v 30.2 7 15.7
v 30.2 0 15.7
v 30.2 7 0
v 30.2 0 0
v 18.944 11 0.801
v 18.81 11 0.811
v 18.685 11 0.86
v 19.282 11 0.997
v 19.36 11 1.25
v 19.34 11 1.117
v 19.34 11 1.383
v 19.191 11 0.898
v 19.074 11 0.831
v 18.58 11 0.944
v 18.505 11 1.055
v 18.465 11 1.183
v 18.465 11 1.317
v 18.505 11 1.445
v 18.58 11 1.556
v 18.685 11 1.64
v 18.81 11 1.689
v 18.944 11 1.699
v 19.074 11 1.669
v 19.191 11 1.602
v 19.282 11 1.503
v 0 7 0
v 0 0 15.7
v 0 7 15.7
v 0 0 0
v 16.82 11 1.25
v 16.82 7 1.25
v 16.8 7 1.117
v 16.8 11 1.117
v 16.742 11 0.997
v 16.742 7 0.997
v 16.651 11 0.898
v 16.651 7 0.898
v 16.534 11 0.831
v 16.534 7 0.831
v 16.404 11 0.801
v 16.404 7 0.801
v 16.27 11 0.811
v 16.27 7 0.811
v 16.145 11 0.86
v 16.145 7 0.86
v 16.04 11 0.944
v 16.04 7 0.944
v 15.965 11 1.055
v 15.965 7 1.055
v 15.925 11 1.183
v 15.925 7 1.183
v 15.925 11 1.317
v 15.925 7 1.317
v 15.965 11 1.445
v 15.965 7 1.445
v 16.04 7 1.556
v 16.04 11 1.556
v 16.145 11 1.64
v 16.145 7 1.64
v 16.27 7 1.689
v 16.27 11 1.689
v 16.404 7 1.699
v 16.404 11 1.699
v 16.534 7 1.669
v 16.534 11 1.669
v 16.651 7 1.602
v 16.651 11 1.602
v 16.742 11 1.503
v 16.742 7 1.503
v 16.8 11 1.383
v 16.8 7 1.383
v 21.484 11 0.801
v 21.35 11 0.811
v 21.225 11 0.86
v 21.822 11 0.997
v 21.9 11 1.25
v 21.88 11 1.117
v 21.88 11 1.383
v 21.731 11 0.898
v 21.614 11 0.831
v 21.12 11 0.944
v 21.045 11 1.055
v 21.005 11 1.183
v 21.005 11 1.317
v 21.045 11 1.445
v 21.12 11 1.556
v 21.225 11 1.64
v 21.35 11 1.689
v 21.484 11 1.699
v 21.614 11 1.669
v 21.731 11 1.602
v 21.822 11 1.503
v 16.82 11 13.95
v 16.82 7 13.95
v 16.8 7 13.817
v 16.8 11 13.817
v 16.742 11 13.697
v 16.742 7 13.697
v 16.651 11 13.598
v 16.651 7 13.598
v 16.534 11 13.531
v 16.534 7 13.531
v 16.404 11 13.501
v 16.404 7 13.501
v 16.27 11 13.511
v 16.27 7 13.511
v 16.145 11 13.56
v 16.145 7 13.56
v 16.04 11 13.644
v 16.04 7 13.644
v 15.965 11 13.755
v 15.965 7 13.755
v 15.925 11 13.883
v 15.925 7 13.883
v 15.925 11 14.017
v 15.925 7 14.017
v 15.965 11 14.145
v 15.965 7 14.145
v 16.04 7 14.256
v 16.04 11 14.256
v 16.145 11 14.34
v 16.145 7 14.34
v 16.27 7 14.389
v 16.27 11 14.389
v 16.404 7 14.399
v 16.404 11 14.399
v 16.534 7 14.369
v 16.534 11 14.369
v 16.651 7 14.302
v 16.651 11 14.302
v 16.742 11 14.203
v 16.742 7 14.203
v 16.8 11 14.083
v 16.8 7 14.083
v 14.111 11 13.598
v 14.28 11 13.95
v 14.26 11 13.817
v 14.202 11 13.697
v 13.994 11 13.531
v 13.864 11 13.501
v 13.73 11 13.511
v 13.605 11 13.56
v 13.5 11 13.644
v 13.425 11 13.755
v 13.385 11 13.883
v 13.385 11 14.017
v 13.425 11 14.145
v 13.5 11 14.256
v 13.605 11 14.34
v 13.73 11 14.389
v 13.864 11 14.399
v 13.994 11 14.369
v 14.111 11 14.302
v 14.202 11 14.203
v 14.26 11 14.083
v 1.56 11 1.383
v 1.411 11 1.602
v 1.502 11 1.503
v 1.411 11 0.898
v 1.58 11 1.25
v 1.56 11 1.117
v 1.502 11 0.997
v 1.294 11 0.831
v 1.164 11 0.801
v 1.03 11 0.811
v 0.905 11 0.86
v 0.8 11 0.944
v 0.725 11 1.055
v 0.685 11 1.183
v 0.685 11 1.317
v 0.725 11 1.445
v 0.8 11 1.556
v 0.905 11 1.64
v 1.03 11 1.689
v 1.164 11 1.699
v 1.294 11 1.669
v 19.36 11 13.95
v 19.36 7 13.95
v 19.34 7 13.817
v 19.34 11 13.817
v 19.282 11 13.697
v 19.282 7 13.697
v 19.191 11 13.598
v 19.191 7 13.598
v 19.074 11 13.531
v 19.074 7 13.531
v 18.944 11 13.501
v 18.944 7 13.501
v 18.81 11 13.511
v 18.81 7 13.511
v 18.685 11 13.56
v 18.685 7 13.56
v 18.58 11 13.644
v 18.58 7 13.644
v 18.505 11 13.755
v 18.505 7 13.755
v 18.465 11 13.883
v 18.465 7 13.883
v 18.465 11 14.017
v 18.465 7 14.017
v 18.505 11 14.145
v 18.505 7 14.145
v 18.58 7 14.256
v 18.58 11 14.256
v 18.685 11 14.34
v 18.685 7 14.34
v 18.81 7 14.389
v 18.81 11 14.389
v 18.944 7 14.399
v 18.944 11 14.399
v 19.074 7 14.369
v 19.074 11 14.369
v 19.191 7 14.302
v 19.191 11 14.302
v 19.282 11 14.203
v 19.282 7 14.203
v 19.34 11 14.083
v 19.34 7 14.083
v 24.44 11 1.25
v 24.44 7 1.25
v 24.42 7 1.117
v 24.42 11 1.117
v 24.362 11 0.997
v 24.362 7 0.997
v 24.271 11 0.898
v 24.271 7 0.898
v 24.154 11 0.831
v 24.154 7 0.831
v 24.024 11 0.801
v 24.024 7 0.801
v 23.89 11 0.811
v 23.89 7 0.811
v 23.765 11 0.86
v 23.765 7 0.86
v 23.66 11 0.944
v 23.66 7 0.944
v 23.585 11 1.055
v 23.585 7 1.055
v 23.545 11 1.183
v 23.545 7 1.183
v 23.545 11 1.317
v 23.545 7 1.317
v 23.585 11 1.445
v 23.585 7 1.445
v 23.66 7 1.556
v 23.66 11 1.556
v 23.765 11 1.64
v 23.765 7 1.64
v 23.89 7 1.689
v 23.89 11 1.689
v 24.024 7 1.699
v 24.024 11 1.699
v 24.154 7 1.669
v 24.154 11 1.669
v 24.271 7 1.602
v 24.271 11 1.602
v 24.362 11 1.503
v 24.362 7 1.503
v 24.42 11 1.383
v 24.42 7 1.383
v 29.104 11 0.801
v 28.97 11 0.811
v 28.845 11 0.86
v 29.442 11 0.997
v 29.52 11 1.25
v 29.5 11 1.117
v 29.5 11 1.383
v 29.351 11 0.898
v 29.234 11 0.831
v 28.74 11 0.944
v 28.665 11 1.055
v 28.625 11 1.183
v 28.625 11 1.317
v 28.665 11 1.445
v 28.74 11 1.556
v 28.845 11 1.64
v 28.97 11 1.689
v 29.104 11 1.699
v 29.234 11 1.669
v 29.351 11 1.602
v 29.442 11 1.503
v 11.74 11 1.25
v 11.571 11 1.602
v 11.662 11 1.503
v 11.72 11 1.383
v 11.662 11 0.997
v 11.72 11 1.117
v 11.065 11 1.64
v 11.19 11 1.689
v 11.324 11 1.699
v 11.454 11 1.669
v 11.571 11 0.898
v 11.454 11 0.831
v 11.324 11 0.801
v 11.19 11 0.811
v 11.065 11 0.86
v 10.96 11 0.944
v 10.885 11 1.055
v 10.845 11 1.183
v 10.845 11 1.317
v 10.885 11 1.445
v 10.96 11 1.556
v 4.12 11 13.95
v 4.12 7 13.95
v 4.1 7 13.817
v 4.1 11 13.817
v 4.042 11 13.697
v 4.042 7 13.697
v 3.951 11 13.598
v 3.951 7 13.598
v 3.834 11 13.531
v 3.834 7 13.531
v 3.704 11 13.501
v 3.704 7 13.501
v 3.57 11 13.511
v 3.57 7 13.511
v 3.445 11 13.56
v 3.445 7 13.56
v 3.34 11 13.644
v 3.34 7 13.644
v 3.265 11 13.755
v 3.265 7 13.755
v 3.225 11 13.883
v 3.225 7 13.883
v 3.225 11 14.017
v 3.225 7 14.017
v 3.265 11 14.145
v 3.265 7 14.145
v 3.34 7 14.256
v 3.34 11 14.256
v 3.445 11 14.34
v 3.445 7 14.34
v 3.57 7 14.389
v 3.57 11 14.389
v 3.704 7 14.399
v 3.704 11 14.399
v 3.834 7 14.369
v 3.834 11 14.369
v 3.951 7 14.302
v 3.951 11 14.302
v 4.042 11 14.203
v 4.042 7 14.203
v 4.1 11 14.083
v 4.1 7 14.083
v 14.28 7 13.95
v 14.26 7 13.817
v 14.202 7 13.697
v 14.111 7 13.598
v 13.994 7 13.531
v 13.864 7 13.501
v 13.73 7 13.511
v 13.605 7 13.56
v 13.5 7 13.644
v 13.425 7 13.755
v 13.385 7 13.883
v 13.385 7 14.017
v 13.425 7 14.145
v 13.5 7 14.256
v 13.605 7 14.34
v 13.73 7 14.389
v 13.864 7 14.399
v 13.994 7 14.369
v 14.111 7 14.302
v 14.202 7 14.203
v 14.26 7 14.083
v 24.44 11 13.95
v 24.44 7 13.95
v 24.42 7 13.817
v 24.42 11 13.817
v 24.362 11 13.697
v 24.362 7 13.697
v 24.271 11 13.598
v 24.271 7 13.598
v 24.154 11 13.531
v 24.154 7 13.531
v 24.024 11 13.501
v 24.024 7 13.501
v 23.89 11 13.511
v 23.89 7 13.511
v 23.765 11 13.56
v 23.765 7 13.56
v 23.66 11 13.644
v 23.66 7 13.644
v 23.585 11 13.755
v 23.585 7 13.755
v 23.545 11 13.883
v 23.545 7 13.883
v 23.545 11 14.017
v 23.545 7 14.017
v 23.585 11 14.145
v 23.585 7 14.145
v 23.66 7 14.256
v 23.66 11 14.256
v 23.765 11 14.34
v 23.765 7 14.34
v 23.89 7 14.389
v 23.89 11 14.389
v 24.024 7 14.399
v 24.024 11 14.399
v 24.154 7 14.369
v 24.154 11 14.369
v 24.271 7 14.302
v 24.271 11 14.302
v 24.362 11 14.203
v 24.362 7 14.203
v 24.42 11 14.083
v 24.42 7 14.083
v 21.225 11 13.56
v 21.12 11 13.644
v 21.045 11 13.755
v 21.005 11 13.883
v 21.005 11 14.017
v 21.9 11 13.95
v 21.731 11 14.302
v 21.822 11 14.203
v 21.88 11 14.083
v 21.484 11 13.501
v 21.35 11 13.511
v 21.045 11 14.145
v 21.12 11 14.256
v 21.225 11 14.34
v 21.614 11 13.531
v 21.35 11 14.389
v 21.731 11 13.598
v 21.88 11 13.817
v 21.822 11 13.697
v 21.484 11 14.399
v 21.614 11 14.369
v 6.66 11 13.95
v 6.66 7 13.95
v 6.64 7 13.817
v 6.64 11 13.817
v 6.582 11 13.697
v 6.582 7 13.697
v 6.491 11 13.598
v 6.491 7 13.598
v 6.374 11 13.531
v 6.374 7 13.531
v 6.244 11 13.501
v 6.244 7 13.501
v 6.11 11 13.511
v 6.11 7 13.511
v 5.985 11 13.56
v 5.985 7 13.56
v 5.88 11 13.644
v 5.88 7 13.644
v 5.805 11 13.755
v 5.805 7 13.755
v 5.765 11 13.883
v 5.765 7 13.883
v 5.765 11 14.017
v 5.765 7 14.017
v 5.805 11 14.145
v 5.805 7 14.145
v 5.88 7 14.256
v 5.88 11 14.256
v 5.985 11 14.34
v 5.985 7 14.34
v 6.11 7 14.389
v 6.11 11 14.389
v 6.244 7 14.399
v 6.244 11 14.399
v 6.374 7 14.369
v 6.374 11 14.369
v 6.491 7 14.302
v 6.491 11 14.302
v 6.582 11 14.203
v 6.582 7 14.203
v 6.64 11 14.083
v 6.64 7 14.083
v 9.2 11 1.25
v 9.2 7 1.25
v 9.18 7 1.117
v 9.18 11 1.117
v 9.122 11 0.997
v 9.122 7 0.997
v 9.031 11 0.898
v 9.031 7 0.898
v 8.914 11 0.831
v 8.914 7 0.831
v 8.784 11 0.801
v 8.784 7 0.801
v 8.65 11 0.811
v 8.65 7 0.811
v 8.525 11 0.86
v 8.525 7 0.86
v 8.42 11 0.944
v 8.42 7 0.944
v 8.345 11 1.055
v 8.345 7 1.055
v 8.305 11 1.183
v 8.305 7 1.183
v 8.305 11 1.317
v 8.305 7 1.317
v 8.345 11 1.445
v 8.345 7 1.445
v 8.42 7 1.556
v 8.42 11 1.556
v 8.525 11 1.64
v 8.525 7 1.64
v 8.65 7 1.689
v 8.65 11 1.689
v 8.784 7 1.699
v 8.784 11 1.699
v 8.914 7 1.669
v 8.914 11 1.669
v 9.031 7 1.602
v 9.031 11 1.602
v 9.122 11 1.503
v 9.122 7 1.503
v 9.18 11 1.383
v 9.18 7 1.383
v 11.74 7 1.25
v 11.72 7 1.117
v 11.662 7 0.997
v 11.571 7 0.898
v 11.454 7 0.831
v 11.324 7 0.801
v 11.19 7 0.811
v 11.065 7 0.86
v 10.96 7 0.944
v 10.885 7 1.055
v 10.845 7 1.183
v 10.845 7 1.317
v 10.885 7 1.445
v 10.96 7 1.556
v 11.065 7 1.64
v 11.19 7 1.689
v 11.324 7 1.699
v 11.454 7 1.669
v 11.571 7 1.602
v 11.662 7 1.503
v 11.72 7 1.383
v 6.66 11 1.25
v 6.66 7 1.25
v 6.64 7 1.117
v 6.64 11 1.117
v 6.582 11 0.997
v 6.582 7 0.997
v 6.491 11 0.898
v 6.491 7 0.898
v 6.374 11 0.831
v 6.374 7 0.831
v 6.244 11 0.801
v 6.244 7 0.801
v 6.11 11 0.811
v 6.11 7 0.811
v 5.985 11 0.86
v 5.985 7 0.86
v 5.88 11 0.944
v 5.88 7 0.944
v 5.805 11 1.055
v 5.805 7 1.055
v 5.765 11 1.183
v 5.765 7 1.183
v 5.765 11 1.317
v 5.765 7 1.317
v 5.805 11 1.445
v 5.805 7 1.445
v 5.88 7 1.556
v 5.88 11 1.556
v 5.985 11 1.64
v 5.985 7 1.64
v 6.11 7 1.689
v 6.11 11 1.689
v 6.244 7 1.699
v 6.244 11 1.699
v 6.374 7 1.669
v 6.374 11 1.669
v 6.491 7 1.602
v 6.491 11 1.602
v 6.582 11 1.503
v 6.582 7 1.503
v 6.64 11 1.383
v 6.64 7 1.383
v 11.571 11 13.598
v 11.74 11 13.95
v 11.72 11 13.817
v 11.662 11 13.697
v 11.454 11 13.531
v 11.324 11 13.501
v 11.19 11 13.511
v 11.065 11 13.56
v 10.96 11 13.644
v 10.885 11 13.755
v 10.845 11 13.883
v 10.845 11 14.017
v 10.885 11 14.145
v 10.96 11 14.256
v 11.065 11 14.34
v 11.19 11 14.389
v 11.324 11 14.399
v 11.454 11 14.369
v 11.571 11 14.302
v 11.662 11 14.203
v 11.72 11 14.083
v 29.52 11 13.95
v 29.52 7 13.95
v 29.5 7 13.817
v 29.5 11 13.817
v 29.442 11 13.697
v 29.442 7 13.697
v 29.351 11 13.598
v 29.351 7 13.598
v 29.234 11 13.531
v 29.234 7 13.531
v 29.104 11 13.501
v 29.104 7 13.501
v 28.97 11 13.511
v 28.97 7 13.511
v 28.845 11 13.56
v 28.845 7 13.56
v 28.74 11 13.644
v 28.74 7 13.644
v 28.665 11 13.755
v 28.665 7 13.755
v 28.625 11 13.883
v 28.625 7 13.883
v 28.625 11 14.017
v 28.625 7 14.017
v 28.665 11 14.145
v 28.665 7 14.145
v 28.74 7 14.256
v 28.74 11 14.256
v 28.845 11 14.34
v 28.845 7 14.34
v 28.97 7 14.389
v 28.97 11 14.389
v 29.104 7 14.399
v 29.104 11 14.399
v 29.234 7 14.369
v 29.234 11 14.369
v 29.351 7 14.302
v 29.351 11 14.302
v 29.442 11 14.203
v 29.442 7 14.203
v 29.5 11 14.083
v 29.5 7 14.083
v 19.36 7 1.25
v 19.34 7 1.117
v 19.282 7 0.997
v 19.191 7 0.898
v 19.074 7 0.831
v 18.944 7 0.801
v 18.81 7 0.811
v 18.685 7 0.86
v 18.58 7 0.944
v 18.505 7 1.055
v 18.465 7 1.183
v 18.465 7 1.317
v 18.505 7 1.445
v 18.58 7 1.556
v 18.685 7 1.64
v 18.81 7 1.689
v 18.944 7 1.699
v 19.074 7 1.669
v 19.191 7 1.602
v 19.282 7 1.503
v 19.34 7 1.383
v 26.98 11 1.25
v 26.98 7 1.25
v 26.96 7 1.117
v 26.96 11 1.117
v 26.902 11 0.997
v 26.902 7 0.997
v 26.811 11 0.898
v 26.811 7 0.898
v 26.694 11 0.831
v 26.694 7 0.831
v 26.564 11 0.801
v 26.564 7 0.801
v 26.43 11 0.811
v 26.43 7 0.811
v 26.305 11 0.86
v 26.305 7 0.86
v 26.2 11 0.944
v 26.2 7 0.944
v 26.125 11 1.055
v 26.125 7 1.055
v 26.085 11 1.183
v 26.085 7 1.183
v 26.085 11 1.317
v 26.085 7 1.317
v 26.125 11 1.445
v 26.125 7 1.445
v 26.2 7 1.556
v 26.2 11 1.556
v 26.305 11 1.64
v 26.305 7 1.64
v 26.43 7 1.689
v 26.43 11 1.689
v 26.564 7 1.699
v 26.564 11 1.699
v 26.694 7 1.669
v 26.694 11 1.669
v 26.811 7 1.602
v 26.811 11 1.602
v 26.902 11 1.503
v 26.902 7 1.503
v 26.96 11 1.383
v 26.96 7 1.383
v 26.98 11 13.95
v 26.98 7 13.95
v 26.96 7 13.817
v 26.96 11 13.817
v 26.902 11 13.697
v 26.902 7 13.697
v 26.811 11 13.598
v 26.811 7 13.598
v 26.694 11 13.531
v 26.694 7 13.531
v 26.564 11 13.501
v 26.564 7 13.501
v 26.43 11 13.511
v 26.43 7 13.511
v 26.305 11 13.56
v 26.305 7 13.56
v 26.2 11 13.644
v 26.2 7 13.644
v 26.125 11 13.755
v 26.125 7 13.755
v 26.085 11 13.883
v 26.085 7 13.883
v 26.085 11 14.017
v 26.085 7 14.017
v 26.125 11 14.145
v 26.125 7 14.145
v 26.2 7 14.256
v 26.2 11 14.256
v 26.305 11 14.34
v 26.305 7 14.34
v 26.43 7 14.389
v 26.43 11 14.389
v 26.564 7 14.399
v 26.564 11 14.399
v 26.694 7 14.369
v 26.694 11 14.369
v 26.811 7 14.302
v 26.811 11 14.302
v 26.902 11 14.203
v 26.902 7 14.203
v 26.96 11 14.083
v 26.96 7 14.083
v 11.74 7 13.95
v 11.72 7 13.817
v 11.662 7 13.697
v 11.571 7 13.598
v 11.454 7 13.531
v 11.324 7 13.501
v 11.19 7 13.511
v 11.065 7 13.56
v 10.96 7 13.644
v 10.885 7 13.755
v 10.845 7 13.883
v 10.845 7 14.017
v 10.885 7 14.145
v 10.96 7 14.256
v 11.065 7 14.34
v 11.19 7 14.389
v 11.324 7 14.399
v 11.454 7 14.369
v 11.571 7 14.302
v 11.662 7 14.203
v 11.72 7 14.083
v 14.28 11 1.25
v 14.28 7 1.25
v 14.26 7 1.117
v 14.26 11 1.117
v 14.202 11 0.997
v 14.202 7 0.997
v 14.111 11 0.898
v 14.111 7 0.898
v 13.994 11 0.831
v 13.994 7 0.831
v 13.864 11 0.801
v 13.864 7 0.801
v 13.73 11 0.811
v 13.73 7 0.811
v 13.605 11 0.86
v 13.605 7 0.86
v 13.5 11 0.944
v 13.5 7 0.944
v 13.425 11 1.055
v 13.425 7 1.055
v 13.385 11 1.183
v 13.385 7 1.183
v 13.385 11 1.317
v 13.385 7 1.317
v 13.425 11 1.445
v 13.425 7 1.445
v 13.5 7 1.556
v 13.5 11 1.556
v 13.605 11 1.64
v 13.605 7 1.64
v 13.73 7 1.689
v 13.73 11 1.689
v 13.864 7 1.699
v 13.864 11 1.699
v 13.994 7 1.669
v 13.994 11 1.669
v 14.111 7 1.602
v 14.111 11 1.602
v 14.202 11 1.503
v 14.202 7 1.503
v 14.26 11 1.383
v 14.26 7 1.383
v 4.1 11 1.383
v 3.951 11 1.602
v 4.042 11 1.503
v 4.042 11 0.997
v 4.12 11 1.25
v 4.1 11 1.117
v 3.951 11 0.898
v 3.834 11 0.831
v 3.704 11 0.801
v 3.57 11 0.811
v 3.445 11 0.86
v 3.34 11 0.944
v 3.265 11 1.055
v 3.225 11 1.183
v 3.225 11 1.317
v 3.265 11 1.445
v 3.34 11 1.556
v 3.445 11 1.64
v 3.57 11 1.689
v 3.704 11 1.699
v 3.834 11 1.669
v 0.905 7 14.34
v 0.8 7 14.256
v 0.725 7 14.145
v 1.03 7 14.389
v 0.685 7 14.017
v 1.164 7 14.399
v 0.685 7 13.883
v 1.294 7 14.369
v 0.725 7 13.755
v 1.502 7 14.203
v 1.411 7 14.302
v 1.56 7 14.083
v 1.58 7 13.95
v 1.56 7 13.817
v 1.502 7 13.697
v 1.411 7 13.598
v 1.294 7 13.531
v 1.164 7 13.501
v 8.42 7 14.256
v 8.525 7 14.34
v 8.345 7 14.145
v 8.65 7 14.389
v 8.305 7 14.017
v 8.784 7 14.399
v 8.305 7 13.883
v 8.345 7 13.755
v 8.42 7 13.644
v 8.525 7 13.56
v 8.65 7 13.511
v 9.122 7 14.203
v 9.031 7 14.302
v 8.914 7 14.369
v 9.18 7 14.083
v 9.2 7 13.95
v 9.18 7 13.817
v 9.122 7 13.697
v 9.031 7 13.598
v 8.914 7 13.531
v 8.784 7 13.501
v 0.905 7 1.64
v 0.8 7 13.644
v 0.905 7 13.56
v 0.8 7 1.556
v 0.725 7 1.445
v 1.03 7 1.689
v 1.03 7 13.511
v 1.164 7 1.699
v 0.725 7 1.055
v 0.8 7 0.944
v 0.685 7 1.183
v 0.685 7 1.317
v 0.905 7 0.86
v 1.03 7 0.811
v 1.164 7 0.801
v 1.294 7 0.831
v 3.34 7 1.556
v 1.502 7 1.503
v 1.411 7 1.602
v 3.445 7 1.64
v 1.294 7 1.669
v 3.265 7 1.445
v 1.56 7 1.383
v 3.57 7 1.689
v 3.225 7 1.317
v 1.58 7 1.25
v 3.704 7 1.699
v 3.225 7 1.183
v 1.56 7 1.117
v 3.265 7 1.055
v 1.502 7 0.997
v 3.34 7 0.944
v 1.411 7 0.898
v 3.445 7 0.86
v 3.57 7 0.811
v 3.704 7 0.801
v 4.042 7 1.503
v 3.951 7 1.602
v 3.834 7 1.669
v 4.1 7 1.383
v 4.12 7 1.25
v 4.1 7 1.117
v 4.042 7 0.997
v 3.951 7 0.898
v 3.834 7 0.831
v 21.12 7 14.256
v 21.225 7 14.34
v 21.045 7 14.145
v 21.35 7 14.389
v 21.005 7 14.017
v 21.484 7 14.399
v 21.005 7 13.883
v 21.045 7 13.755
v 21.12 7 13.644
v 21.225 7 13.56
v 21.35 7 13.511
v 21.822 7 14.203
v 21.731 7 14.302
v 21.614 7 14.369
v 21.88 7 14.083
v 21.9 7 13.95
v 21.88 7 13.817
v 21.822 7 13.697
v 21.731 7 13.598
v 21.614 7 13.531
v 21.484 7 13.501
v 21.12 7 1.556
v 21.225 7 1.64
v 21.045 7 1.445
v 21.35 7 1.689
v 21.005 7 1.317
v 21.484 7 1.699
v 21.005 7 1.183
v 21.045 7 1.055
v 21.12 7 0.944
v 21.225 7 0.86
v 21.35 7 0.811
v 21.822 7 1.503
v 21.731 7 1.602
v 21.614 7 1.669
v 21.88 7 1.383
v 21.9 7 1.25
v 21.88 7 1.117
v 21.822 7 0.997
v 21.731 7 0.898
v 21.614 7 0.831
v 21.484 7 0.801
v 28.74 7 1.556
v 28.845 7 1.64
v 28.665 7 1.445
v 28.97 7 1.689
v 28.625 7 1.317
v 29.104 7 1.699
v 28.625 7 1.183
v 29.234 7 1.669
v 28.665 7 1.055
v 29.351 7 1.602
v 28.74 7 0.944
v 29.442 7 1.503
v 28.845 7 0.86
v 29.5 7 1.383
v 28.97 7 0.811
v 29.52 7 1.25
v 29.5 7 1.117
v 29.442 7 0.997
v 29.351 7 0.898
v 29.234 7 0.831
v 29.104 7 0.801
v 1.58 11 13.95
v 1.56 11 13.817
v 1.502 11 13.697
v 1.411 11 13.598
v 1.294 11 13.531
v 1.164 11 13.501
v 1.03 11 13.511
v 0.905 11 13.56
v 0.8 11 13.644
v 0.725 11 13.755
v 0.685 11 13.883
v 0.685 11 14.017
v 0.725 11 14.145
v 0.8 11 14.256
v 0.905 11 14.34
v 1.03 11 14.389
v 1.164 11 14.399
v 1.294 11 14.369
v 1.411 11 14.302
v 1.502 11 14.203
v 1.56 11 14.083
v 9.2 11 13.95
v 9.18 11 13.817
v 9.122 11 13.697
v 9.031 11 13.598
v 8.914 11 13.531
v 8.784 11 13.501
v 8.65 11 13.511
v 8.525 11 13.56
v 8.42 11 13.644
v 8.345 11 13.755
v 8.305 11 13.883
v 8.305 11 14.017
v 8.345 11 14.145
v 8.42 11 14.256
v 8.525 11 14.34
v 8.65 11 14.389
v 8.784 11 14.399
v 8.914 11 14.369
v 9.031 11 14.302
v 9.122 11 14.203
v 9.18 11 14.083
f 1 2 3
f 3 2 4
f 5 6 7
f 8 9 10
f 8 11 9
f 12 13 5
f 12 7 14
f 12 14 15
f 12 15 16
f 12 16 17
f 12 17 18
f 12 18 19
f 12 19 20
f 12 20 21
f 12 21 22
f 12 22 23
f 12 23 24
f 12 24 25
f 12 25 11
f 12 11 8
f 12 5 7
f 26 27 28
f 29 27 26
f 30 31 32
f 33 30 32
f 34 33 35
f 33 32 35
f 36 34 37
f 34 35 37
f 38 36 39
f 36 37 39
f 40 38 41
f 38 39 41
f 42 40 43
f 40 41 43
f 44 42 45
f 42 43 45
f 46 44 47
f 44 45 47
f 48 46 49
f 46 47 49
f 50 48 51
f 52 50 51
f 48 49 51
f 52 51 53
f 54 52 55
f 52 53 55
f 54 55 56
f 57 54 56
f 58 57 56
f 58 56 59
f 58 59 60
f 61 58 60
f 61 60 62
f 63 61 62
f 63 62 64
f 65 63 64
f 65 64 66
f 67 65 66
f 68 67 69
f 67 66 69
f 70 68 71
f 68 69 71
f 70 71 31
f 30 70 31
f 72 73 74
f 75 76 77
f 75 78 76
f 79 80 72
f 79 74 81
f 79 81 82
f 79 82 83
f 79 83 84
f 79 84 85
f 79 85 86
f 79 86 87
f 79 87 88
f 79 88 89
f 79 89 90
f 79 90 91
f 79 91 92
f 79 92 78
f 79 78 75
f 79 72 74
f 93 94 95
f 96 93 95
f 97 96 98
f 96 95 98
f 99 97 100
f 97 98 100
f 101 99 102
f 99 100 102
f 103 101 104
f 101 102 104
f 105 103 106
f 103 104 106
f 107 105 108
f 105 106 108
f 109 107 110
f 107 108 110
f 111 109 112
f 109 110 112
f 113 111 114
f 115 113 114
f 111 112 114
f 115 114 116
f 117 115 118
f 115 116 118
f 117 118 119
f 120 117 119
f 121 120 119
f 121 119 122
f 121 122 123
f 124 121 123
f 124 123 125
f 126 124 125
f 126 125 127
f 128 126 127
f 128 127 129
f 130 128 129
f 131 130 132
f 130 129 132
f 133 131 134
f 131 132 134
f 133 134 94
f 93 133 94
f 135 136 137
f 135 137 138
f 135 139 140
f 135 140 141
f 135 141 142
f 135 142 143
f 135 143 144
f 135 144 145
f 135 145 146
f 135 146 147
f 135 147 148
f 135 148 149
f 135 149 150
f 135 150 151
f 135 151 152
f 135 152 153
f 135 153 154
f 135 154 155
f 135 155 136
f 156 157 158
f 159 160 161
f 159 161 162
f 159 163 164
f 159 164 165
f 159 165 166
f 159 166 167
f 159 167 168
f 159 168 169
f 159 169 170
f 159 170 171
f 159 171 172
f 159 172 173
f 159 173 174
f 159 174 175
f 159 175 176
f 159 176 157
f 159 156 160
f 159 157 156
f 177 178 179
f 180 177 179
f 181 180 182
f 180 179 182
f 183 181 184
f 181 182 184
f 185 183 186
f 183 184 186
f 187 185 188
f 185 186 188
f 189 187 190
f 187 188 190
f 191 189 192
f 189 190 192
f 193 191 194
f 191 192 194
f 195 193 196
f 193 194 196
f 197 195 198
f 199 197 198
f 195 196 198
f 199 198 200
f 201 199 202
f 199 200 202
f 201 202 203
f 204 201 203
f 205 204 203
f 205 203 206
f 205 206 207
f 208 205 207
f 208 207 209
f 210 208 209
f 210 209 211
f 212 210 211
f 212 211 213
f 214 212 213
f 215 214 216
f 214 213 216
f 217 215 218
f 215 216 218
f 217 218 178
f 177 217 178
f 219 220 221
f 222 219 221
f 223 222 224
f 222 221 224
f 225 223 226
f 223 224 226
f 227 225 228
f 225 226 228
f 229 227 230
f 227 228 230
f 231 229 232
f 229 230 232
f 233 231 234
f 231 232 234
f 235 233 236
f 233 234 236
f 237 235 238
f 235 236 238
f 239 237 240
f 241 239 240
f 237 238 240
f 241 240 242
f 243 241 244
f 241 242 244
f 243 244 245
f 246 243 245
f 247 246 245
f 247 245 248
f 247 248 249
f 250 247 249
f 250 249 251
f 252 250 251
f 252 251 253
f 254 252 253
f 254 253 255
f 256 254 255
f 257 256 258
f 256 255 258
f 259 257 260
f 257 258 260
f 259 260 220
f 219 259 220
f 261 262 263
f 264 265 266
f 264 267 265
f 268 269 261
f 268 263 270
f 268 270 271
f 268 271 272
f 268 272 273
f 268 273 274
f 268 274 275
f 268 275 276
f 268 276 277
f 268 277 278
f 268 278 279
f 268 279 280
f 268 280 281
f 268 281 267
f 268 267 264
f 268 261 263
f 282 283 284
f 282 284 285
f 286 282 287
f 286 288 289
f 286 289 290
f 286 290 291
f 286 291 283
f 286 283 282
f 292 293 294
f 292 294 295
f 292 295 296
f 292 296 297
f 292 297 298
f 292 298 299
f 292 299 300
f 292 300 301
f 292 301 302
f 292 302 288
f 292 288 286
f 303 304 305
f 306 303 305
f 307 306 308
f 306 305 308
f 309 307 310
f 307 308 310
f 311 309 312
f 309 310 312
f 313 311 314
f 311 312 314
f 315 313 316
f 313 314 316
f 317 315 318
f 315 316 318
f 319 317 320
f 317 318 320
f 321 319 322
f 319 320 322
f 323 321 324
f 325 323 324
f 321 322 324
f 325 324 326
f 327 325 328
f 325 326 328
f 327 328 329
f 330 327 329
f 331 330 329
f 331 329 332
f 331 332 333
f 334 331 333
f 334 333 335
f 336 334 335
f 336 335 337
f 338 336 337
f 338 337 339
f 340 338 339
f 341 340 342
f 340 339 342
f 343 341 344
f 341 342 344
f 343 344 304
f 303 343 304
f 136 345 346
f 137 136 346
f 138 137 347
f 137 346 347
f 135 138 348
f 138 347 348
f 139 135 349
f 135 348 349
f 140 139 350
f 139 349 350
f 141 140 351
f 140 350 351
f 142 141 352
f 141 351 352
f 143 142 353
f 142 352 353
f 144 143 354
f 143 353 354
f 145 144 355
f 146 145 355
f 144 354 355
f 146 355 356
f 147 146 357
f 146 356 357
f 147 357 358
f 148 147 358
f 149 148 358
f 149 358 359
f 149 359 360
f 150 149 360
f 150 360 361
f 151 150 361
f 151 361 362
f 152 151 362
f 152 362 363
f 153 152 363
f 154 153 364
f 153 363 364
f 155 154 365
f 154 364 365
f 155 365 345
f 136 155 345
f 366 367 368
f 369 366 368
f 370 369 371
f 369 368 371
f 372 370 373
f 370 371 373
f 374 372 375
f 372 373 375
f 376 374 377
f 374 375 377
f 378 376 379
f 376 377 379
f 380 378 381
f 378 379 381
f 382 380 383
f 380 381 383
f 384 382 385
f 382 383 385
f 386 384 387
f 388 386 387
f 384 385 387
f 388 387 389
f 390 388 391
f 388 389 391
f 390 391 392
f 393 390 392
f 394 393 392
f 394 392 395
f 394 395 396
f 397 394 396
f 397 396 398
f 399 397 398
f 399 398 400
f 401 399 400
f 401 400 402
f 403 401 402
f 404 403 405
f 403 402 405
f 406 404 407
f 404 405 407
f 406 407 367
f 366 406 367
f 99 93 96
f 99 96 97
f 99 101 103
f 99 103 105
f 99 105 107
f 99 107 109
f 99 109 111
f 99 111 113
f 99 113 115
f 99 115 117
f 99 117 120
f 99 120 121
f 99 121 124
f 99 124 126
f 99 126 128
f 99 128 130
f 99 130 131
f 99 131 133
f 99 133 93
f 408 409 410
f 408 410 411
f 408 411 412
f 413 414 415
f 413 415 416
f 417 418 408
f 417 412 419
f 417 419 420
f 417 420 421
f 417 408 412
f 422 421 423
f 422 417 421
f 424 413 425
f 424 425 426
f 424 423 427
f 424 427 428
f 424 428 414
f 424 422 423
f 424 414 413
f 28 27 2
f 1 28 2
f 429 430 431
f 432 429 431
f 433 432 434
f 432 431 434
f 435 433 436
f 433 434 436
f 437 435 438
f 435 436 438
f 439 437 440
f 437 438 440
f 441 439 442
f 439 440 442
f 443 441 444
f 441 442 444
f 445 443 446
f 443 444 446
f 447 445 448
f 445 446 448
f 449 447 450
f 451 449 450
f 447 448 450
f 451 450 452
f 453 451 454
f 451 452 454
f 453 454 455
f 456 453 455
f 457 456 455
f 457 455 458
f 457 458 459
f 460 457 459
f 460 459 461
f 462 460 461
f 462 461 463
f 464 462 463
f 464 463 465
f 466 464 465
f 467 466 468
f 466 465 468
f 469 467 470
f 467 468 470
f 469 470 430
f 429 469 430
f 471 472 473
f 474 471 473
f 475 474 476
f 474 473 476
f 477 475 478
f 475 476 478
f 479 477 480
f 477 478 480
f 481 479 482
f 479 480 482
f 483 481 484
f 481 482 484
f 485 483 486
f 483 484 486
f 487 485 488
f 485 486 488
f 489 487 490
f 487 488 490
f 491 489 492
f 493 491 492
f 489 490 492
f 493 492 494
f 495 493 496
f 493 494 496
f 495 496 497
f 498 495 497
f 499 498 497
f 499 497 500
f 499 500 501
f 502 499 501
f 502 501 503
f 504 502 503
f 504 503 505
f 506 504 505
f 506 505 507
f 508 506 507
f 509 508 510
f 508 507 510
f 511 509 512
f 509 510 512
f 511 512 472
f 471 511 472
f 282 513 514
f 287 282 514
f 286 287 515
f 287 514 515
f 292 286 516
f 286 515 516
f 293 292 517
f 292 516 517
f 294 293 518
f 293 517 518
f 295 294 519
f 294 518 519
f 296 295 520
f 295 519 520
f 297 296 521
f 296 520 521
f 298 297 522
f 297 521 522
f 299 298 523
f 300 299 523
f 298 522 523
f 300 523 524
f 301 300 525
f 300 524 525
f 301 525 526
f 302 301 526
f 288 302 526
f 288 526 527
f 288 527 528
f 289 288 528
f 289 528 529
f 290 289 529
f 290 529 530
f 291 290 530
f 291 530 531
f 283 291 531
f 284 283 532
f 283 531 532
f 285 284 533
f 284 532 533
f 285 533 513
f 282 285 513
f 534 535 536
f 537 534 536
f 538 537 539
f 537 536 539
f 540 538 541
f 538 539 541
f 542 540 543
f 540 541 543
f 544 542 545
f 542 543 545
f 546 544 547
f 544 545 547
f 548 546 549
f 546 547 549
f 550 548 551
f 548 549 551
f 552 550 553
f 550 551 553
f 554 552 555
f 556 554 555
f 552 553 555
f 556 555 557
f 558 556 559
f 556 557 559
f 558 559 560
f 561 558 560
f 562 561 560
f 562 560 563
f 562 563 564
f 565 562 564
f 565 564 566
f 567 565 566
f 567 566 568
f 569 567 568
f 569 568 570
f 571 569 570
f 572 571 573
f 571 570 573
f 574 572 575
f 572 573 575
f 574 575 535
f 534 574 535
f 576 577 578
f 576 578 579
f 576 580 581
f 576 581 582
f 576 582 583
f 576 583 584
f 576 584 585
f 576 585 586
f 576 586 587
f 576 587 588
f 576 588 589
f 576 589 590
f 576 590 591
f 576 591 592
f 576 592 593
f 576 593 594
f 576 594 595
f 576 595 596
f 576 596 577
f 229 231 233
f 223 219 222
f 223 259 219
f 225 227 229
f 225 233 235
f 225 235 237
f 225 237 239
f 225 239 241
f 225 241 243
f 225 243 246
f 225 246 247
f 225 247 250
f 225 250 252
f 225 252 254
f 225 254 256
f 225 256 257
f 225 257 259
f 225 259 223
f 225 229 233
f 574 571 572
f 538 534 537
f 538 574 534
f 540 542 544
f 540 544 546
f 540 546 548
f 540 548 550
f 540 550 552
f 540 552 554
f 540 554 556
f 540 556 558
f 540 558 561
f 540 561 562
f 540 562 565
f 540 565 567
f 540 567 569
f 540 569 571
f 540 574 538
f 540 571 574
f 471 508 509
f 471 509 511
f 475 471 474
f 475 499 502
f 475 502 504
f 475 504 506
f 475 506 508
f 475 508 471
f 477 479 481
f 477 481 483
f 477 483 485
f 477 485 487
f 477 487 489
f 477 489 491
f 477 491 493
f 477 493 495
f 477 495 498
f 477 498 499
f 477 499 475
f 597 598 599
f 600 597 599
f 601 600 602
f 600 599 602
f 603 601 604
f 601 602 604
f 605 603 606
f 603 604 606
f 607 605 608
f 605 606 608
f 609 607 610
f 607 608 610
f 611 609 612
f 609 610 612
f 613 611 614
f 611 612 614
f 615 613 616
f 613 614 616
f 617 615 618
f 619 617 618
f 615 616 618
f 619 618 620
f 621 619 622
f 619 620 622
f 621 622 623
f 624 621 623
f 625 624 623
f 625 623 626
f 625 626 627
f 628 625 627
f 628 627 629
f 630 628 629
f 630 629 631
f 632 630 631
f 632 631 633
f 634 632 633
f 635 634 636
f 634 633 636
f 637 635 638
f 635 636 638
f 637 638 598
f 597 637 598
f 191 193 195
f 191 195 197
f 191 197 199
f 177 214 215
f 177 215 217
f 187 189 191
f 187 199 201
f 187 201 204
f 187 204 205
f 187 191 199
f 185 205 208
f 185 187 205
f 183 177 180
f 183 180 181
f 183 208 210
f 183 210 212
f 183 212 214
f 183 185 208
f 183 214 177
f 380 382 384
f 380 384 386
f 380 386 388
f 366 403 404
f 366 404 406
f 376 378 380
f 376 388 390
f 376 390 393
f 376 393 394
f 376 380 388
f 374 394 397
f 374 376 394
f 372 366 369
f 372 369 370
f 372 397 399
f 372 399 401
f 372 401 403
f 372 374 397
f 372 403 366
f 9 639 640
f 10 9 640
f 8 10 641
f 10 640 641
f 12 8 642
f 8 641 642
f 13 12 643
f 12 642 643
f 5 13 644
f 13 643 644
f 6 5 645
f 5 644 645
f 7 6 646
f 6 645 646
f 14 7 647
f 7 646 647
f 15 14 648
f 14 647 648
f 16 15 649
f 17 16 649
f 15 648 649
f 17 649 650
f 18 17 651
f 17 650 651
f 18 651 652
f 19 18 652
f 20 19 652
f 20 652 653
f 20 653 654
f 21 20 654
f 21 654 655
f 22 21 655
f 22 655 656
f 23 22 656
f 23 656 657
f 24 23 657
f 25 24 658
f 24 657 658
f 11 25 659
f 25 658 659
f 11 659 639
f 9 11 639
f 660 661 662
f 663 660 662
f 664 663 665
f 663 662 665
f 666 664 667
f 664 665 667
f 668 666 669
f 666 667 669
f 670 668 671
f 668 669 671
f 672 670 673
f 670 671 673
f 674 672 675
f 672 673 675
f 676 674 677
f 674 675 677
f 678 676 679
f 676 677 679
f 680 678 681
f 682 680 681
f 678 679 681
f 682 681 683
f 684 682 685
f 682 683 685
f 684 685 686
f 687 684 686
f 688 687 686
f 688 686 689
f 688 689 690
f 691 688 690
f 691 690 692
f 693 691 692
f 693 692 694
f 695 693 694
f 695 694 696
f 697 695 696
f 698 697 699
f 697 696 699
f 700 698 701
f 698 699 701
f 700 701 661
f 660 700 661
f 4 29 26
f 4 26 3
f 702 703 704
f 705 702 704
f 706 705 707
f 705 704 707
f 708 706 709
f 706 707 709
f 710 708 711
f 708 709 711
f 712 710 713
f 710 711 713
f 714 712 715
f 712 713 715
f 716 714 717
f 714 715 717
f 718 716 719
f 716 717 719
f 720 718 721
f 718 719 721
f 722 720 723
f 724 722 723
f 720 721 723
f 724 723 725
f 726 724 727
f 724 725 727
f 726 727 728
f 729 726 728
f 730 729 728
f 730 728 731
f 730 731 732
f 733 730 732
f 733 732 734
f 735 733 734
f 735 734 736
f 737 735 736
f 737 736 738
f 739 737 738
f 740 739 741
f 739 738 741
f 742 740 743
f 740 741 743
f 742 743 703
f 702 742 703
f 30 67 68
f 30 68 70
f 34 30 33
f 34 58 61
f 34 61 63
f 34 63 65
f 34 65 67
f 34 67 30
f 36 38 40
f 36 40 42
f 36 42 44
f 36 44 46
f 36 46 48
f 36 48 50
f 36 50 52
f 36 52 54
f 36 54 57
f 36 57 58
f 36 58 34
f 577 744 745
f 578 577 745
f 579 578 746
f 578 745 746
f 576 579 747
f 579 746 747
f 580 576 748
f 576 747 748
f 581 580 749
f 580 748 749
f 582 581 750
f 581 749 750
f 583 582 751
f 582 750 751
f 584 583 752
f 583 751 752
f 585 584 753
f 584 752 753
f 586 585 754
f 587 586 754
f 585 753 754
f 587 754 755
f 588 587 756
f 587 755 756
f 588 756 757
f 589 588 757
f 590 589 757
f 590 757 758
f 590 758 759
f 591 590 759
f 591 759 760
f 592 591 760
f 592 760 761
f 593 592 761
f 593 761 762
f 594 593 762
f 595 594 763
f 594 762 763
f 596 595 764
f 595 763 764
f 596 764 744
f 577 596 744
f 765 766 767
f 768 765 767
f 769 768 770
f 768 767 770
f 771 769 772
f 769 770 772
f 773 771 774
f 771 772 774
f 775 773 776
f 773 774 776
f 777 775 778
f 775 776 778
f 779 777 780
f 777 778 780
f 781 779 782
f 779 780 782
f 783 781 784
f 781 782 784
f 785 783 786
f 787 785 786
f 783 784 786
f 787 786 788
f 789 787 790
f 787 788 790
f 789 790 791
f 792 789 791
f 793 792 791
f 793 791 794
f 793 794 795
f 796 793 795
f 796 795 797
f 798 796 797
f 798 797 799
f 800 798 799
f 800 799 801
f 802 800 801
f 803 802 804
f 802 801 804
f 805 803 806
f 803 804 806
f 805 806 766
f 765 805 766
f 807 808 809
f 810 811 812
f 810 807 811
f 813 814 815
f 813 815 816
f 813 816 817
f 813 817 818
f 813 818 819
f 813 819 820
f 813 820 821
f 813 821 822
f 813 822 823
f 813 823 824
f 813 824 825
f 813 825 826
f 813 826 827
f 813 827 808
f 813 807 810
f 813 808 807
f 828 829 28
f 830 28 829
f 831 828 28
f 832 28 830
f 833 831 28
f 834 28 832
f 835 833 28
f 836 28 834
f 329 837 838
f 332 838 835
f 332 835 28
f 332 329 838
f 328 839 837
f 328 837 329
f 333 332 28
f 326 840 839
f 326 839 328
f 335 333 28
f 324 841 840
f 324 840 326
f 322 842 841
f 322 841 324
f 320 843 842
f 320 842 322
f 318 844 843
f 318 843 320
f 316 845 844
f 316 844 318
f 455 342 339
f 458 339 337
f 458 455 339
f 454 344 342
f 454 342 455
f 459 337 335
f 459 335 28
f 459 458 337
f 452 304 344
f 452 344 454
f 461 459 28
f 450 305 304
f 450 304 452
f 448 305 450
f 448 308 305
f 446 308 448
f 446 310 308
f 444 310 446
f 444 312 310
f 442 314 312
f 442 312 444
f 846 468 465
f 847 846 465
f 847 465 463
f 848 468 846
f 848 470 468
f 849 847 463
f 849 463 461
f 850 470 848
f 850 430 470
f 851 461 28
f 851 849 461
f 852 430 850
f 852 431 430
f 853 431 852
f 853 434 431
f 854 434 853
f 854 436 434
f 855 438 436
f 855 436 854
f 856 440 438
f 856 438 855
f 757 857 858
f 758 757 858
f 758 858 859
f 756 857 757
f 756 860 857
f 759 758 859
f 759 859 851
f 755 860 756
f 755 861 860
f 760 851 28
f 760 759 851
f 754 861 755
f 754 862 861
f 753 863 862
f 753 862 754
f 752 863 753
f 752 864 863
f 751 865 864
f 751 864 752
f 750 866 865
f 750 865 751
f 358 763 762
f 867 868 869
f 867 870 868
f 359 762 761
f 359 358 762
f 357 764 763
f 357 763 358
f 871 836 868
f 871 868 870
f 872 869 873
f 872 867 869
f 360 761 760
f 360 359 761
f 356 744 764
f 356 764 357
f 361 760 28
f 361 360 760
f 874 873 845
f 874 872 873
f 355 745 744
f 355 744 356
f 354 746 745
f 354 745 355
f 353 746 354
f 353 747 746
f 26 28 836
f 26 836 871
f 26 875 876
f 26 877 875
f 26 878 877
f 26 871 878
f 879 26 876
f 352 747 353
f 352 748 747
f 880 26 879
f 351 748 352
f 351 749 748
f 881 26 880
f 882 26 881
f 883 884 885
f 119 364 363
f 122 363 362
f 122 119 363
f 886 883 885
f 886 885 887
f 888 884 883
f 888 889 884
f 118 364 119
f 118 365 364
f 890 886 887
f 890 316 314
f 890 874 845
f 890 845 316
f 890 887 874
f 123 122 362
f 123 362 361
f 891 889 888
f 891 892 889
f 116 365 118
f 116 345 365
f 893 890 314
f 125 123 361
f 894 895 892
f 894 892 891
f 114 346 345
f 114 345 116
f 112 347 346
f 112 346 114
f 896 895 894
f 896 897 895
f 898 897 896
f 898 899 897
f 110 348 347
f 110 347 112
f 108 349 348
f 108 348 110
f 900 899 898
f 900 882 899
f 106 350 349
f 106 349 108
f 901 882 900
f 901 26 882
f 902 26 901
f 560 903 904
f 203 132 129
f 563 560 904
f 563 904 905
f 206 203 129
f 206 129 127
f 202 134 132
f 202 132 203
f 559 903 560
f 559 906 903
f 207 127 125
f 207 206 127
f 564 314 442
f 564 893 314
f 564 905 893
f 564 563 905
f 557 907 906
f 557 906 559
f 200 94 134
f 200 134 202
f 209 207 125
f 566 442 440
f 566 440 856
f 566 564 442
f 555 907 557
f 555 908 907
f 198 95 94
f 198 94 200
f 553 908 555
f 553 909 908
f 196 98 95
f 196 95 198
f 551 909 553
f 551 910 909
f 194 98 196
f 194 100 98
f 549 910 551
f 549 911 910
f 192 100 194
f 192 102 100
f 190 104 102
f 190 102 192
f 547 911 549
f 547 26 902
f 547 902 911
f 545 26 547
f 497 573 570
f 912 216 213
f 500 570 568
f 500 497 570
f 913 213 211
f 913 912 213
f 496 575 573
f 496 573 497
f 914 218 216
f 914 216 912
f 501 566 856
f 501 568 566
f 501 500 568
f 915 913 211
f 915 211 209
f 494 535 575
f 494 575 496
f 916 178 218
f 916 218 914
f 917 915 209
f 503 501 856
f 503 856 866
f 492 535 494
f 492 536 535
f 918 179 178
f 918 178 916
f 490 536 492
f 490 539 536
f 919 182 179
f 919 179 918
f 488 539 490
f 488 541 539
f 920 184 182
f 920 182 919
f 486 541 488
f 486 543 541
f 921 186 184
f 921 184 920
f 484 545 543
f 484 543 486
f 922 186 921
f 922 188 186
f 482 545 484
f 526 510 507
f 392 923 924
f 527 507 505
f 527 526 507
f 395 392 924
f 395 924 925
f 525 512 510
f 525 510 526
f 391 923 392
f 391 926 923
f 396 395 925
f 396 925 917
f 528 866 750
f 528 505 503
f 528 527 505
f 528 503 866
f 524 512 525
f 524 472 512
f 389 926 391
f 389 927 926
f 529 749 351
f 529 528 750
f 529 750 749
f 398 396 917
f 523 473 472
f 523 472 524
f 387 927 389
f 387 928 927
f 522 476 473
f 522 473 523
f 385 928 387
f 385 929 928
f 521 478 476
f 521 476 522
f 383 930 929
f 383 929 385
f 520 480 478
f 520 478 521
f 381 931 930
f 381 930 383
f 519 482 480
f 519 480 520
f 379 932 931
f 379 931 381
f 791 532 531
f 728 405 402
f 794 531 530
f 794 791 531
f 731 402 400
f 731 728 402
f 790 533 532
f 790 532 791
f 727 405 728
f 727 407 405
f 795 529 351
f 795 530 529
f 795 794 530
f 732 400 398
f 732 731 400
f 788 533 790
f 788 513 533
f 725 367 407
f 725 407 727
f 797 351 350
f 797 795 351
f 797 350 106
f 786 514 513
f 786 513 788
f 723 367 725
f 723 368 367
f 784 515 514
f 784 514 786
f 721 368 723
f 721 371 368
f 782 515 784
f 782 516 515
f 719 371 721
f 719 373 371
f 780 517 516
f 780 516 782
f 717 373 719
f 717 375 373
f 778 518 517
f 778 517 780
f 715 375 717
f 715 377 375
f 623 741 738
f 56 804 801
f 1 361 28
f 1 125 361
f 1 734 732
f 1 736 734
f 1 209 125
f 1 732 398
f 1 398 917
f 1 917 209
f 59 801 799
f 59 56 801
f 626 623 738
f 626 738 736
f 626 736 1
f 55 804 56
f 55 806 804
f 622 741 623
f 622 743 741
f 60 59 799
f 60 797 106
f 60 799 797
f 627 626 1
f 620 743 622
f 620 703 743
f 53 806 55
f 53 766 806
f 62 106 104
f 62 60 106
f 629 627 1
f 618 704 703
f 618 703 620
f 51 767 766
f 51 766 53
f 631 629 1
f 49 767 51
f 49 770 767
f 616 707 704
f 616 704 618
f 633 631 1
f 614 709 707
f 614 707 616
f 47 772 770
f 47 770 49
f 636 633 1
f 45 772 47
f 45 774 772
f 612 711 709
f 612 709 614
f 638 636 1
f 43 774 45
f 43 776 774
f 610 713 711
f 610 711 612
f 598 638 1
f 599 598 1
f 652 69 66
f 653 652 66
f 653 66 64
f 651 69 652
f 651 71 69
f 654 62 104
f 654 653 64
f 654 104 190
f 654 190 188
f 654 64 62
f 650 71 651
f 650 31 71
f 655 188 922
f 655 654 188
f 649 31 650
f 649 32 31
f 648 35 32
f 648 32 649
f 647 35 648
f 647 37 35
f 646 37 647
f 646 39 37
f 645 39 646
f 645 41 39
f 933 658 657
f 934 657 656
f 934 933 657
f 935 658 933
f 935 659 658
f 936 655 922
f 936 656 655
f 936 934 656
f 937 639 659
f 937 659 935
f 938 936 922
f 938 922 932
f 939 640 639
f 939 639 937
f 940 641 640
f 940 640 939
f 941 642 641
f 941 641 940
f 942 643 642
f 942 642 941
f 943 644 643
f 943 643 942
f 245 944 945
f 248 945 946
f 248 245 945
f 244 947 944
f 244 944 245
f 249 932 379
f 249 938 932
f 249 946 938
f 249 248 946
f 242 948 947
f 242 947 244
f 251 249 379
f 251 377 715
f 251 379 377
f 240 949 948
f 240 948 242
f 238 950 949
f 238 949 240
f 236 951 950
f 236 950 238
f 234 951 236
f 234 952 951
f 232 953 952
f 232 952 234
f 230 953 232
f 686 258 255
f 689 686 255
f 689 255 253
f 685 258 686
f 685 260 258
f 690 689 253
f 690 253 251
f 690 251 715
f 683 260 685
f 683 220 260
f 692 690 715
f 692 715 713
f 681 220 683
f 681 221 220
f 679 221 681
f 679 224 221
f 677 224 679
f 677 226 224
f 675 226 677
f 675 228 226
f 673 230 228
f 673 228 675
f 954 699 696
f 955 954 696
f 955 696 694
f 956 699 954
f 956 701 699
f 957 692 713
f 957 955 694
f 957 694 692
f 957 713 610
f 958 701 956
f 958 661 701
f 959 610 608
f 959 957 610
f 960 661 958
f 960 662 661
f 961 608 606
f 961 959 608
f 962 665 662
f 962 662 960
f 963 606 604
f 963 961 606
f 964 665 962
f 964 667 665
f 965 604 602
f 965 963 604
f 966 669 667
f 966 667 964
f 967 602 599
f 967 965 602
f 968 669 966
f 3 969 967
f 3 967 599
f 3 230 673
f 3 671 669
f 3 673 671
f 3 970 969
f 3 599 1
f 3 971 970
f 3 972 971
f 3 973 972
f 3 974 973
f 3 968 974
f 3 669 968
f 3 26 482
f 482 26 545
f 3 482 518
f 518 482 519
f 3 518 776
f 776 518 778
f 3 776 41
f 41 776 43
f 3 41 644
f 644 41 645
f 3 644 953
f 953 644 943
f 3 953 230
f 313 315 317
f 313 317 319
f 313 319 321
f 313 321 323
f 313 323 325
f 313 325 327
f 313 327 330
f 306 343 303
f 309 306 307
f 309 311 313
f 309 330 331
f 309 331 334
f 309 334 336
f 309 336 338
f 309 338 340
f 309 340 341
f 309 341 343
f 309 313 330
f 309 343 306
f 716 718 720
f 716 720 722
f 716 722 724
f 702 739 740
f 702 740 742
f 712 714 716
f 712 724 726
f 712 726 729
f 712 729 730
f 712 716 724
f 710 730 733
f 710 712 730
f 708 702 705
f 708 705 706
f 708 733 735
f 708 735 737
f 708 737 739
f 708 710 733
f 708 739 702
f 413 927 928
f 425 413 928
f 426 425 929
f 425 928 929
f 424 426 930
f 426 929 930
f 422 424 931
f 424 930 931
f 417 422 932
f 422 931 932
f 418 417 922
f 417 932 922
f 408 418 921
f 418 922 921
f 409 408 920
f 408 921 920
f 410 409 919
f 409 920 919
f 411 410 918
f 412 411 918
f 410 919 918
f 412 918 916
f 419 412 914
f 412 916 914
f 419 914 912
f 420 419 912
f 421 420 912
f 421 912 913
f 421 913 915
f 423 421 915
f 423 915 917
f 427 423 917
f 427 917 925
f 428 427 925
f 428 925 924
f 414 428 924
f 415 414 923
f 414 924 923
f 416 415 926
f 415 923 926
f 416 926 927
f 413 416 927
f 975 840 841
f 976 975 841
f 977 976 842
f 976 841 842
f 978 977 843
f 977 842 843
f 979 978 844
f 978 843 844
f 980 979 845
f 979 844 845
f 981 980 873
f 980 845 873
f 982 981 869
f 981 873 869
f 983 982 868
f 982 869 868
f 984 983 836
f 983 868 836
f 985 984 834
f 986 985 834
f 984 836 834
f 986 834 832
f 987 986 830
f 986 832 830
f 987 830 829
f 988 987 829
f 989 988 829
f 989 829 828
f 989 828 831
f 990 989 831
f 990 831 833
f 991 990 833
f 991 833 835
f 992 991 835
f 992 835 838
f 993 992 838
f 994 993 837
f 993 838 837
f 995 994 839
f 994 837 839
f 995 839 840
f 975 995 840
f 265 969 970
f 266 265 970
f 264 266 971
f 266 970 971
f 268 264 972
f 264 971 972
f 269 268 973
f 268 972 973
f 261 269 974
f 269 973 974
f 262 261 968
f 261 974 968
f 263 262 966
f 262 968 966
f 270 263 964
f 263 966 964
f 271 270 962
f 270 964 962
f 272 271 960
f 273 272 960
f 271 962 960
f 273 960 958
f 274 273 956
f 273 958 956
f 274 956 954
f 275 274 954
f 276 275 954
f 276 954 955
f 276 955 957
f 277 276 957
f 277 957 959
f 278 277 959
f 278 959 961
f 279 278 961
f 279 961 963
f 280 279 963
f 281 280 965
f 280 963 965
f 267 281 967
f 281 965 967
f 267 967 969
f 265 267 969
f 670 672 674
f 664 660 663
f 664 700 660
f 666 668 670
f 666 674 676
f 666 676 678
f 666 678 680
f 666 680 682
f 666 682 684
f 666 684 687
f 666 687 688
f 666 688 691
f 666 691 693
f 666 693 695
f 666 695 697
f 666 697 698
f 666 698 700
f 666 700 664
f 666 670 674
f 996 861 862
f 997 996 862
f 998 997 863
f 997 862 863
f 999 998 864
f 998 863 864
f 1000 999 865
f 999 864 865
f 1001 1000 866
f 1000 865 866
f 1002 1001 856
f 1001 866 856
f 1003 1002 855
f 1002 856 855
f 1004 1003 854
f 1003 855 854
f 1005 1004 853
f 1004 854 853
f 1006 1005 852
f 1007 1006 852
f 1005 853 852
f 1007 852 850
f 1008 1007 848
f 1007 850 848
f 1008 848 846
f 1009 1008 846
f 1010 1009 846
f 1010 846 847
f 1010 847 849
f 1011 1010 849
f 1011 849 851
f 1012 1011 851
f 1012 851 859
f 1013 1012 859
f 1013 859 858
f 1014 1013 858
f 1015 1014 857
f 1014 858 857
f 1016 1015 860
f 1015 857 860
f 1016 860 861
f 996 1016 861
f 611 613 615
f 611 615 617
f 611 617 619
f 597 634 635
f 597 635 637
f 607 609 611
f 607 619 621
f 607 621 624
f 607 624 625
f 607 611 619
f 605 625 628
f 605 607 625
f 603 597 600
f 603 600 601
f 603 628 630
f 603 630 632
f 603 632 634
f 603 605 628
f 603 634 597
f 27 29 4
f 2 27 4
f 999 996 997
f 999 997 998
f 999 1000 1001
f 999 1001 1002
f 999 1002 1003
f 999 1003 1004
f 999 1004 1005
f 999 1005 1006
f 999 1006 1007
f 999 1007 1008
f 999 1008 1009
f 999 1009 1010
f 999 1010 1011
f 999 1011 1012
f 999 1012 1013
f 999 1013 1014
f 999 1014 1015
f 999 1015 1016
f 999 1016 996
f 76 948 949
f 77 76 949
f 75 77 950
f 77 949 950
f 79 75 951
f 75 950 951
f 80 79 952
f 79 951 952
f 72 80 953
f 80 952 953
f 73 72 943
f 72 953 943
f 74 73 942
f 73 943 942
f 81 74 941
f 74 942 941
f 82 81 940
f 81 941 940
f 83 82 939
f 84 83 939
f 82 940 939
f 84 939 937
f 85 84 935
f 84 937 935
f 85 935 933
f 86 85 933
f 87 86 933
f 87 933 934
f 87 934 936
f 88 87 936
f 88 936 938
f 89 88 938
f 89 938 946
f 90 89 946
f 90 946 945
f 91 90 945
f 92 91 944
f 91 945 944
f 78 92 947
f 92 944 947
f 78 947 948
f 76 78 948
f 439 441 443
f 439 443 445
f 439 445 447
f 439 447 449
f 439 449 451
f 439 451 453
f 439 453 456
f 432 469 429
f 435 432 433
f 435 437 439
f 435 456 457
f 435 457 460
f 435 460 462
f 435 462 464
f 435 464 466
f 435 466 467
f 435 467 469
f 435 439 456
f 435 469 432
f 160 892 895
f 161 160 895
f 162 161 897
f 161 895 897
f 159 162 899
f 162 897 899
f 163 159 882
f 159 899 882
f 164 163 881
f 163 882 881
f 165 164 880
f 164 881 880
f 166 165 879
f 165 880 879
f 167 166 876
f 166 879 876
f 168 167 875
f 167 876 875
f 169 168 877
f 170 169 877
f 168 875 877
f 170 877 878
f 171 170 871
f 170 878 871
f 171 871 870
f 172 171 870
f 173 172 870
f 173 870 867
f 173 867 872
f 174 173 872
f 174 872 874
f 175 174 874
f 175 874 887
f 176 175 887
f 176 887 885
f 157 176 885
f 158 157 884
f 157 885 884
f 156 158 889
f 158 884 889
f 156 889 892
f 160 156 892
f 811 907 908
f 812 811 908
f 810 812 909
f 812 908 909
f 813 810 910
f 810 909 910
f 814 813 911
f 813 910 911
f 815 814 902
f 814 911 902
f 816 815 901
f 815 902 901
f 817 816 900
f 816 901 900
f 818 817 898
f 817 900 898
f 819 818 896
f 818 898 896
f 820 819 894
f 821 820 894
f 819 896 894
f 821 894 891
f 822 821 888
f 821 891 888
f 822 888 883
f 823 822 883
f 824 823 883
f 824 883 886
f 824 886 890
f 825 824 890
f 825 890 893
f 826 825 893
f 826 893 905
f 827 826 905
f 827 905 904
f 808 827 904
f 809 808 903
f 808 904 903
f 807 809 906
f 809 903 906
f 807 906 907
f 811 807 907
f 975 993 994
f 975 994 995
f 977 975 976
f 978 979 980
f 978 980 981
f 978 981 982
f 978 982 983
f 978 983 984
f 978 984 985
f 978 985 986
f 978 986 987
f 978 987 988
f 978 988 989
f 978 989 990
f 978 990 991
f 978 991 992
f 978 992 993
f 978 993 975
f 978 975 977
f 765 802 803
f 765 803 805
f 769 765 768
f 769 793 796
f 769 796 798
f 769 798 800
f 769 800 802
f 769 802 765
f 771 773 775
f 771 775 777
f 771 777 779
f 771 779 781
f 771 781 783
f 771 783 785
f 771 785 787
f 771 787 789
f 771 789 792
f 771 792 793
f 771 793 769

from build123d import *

# Parameters (mm, degrees)
SKETCH1_W           = 30.2
SKETCH1_H           = 15.7
BOSS_EXTRUDE1_DEPTH = 7
SKETCH2_R           = 0.45
BOSS_EXTRUDE2_DEPTH = 4


with BuildPart() as part:
    # Sketch1 → Boss-Extrude1 (new body)
    with BuildSketch(Plane(origin=(0, 0, 0), x_dir=(1, 0, 0), z_dir=(0, 1, 0))):
        with Locations((15.1, -7.85)):
            Rectangle(SKETCH1_W, SKETCH1_H)
    extrude(amount=BOSS_EXTRUDE1_DEPTH)

    # Sketch2 → Boss-Extrude2 (add)
    with BuildSketch(Plane(origin=(0, 7, 0), x_dir=(1, 0, 0), z_dir=(0, 1, 0))):
        with Locations((1.13, -1.25)):
            Circle(SKETCH2_R)
        with Locations((3.67, -1.25)):
            Circle(SKETCH2_R)
        with Locations((6.21, -1.25)):
            Circle(SKETCH2_R)
        with Locations((8.75, -1.25)):
            Circle(SKETCH2_R)
        with Locations((11.29, -1.25)):
            Circle(SKETCH2_R)
        with Locations((13.83, -1.25)):
            Circle(SKETCH2_R)
        with Locations((16.37, -1.25)):
            Circle(SKETCH2_R)
        with Locations((18.91, -1.25)):
            Circle(SKETCH2_R)
        with Locations((21.45, -1.25)):
            Circle(SKETCH2_R)
        with Locations((23.99, -1.25)):
            Circle(SKETCH2_R)
        with Locations((26.53, -1.25)):
            Circle(SKETCH2_R)
        with Locations((29.07, -1.25)):
            Circle(SKETCH2_R)
        with Locations((29.07, -13.95)):
            Circle(SKETCH2_R)
        with Locations((26.53, -13.95)):
            Circle(SKETCH2_R)
        with Locations((23.99, -13.95)):
            Circle(SKETCH2_R)
        with Locations((21.45, -13.95)):
            Circle(SKETCH2_R)
        with Locations((18.91, -13.95)):
            Circle(SKETCH2_R)
        with Locations((16.37, -13.95)):
            Circle(SKETCH2_R)
        with Locations((13.83, -13.95)):
            Circle(SKETCH2_R)
        with Locations((11.29, -13.95)):
            Circle(SKETCH2_R)
        with Locations((8.75, -13.95)):
            Circle(SKETCH2_R)
        with Locations((6.21, -13.95)):
            Circle(SKETCH2_R)
        with Locations((3.67, -13.95)):
            Circle(SKETCH2_R)
        with Locations((1.13, -13.95)):
            Circle(SKETCH2_R)
    extrude(amount=BOSS_EXTRUDE2_DEPTH)


solid = part.part
